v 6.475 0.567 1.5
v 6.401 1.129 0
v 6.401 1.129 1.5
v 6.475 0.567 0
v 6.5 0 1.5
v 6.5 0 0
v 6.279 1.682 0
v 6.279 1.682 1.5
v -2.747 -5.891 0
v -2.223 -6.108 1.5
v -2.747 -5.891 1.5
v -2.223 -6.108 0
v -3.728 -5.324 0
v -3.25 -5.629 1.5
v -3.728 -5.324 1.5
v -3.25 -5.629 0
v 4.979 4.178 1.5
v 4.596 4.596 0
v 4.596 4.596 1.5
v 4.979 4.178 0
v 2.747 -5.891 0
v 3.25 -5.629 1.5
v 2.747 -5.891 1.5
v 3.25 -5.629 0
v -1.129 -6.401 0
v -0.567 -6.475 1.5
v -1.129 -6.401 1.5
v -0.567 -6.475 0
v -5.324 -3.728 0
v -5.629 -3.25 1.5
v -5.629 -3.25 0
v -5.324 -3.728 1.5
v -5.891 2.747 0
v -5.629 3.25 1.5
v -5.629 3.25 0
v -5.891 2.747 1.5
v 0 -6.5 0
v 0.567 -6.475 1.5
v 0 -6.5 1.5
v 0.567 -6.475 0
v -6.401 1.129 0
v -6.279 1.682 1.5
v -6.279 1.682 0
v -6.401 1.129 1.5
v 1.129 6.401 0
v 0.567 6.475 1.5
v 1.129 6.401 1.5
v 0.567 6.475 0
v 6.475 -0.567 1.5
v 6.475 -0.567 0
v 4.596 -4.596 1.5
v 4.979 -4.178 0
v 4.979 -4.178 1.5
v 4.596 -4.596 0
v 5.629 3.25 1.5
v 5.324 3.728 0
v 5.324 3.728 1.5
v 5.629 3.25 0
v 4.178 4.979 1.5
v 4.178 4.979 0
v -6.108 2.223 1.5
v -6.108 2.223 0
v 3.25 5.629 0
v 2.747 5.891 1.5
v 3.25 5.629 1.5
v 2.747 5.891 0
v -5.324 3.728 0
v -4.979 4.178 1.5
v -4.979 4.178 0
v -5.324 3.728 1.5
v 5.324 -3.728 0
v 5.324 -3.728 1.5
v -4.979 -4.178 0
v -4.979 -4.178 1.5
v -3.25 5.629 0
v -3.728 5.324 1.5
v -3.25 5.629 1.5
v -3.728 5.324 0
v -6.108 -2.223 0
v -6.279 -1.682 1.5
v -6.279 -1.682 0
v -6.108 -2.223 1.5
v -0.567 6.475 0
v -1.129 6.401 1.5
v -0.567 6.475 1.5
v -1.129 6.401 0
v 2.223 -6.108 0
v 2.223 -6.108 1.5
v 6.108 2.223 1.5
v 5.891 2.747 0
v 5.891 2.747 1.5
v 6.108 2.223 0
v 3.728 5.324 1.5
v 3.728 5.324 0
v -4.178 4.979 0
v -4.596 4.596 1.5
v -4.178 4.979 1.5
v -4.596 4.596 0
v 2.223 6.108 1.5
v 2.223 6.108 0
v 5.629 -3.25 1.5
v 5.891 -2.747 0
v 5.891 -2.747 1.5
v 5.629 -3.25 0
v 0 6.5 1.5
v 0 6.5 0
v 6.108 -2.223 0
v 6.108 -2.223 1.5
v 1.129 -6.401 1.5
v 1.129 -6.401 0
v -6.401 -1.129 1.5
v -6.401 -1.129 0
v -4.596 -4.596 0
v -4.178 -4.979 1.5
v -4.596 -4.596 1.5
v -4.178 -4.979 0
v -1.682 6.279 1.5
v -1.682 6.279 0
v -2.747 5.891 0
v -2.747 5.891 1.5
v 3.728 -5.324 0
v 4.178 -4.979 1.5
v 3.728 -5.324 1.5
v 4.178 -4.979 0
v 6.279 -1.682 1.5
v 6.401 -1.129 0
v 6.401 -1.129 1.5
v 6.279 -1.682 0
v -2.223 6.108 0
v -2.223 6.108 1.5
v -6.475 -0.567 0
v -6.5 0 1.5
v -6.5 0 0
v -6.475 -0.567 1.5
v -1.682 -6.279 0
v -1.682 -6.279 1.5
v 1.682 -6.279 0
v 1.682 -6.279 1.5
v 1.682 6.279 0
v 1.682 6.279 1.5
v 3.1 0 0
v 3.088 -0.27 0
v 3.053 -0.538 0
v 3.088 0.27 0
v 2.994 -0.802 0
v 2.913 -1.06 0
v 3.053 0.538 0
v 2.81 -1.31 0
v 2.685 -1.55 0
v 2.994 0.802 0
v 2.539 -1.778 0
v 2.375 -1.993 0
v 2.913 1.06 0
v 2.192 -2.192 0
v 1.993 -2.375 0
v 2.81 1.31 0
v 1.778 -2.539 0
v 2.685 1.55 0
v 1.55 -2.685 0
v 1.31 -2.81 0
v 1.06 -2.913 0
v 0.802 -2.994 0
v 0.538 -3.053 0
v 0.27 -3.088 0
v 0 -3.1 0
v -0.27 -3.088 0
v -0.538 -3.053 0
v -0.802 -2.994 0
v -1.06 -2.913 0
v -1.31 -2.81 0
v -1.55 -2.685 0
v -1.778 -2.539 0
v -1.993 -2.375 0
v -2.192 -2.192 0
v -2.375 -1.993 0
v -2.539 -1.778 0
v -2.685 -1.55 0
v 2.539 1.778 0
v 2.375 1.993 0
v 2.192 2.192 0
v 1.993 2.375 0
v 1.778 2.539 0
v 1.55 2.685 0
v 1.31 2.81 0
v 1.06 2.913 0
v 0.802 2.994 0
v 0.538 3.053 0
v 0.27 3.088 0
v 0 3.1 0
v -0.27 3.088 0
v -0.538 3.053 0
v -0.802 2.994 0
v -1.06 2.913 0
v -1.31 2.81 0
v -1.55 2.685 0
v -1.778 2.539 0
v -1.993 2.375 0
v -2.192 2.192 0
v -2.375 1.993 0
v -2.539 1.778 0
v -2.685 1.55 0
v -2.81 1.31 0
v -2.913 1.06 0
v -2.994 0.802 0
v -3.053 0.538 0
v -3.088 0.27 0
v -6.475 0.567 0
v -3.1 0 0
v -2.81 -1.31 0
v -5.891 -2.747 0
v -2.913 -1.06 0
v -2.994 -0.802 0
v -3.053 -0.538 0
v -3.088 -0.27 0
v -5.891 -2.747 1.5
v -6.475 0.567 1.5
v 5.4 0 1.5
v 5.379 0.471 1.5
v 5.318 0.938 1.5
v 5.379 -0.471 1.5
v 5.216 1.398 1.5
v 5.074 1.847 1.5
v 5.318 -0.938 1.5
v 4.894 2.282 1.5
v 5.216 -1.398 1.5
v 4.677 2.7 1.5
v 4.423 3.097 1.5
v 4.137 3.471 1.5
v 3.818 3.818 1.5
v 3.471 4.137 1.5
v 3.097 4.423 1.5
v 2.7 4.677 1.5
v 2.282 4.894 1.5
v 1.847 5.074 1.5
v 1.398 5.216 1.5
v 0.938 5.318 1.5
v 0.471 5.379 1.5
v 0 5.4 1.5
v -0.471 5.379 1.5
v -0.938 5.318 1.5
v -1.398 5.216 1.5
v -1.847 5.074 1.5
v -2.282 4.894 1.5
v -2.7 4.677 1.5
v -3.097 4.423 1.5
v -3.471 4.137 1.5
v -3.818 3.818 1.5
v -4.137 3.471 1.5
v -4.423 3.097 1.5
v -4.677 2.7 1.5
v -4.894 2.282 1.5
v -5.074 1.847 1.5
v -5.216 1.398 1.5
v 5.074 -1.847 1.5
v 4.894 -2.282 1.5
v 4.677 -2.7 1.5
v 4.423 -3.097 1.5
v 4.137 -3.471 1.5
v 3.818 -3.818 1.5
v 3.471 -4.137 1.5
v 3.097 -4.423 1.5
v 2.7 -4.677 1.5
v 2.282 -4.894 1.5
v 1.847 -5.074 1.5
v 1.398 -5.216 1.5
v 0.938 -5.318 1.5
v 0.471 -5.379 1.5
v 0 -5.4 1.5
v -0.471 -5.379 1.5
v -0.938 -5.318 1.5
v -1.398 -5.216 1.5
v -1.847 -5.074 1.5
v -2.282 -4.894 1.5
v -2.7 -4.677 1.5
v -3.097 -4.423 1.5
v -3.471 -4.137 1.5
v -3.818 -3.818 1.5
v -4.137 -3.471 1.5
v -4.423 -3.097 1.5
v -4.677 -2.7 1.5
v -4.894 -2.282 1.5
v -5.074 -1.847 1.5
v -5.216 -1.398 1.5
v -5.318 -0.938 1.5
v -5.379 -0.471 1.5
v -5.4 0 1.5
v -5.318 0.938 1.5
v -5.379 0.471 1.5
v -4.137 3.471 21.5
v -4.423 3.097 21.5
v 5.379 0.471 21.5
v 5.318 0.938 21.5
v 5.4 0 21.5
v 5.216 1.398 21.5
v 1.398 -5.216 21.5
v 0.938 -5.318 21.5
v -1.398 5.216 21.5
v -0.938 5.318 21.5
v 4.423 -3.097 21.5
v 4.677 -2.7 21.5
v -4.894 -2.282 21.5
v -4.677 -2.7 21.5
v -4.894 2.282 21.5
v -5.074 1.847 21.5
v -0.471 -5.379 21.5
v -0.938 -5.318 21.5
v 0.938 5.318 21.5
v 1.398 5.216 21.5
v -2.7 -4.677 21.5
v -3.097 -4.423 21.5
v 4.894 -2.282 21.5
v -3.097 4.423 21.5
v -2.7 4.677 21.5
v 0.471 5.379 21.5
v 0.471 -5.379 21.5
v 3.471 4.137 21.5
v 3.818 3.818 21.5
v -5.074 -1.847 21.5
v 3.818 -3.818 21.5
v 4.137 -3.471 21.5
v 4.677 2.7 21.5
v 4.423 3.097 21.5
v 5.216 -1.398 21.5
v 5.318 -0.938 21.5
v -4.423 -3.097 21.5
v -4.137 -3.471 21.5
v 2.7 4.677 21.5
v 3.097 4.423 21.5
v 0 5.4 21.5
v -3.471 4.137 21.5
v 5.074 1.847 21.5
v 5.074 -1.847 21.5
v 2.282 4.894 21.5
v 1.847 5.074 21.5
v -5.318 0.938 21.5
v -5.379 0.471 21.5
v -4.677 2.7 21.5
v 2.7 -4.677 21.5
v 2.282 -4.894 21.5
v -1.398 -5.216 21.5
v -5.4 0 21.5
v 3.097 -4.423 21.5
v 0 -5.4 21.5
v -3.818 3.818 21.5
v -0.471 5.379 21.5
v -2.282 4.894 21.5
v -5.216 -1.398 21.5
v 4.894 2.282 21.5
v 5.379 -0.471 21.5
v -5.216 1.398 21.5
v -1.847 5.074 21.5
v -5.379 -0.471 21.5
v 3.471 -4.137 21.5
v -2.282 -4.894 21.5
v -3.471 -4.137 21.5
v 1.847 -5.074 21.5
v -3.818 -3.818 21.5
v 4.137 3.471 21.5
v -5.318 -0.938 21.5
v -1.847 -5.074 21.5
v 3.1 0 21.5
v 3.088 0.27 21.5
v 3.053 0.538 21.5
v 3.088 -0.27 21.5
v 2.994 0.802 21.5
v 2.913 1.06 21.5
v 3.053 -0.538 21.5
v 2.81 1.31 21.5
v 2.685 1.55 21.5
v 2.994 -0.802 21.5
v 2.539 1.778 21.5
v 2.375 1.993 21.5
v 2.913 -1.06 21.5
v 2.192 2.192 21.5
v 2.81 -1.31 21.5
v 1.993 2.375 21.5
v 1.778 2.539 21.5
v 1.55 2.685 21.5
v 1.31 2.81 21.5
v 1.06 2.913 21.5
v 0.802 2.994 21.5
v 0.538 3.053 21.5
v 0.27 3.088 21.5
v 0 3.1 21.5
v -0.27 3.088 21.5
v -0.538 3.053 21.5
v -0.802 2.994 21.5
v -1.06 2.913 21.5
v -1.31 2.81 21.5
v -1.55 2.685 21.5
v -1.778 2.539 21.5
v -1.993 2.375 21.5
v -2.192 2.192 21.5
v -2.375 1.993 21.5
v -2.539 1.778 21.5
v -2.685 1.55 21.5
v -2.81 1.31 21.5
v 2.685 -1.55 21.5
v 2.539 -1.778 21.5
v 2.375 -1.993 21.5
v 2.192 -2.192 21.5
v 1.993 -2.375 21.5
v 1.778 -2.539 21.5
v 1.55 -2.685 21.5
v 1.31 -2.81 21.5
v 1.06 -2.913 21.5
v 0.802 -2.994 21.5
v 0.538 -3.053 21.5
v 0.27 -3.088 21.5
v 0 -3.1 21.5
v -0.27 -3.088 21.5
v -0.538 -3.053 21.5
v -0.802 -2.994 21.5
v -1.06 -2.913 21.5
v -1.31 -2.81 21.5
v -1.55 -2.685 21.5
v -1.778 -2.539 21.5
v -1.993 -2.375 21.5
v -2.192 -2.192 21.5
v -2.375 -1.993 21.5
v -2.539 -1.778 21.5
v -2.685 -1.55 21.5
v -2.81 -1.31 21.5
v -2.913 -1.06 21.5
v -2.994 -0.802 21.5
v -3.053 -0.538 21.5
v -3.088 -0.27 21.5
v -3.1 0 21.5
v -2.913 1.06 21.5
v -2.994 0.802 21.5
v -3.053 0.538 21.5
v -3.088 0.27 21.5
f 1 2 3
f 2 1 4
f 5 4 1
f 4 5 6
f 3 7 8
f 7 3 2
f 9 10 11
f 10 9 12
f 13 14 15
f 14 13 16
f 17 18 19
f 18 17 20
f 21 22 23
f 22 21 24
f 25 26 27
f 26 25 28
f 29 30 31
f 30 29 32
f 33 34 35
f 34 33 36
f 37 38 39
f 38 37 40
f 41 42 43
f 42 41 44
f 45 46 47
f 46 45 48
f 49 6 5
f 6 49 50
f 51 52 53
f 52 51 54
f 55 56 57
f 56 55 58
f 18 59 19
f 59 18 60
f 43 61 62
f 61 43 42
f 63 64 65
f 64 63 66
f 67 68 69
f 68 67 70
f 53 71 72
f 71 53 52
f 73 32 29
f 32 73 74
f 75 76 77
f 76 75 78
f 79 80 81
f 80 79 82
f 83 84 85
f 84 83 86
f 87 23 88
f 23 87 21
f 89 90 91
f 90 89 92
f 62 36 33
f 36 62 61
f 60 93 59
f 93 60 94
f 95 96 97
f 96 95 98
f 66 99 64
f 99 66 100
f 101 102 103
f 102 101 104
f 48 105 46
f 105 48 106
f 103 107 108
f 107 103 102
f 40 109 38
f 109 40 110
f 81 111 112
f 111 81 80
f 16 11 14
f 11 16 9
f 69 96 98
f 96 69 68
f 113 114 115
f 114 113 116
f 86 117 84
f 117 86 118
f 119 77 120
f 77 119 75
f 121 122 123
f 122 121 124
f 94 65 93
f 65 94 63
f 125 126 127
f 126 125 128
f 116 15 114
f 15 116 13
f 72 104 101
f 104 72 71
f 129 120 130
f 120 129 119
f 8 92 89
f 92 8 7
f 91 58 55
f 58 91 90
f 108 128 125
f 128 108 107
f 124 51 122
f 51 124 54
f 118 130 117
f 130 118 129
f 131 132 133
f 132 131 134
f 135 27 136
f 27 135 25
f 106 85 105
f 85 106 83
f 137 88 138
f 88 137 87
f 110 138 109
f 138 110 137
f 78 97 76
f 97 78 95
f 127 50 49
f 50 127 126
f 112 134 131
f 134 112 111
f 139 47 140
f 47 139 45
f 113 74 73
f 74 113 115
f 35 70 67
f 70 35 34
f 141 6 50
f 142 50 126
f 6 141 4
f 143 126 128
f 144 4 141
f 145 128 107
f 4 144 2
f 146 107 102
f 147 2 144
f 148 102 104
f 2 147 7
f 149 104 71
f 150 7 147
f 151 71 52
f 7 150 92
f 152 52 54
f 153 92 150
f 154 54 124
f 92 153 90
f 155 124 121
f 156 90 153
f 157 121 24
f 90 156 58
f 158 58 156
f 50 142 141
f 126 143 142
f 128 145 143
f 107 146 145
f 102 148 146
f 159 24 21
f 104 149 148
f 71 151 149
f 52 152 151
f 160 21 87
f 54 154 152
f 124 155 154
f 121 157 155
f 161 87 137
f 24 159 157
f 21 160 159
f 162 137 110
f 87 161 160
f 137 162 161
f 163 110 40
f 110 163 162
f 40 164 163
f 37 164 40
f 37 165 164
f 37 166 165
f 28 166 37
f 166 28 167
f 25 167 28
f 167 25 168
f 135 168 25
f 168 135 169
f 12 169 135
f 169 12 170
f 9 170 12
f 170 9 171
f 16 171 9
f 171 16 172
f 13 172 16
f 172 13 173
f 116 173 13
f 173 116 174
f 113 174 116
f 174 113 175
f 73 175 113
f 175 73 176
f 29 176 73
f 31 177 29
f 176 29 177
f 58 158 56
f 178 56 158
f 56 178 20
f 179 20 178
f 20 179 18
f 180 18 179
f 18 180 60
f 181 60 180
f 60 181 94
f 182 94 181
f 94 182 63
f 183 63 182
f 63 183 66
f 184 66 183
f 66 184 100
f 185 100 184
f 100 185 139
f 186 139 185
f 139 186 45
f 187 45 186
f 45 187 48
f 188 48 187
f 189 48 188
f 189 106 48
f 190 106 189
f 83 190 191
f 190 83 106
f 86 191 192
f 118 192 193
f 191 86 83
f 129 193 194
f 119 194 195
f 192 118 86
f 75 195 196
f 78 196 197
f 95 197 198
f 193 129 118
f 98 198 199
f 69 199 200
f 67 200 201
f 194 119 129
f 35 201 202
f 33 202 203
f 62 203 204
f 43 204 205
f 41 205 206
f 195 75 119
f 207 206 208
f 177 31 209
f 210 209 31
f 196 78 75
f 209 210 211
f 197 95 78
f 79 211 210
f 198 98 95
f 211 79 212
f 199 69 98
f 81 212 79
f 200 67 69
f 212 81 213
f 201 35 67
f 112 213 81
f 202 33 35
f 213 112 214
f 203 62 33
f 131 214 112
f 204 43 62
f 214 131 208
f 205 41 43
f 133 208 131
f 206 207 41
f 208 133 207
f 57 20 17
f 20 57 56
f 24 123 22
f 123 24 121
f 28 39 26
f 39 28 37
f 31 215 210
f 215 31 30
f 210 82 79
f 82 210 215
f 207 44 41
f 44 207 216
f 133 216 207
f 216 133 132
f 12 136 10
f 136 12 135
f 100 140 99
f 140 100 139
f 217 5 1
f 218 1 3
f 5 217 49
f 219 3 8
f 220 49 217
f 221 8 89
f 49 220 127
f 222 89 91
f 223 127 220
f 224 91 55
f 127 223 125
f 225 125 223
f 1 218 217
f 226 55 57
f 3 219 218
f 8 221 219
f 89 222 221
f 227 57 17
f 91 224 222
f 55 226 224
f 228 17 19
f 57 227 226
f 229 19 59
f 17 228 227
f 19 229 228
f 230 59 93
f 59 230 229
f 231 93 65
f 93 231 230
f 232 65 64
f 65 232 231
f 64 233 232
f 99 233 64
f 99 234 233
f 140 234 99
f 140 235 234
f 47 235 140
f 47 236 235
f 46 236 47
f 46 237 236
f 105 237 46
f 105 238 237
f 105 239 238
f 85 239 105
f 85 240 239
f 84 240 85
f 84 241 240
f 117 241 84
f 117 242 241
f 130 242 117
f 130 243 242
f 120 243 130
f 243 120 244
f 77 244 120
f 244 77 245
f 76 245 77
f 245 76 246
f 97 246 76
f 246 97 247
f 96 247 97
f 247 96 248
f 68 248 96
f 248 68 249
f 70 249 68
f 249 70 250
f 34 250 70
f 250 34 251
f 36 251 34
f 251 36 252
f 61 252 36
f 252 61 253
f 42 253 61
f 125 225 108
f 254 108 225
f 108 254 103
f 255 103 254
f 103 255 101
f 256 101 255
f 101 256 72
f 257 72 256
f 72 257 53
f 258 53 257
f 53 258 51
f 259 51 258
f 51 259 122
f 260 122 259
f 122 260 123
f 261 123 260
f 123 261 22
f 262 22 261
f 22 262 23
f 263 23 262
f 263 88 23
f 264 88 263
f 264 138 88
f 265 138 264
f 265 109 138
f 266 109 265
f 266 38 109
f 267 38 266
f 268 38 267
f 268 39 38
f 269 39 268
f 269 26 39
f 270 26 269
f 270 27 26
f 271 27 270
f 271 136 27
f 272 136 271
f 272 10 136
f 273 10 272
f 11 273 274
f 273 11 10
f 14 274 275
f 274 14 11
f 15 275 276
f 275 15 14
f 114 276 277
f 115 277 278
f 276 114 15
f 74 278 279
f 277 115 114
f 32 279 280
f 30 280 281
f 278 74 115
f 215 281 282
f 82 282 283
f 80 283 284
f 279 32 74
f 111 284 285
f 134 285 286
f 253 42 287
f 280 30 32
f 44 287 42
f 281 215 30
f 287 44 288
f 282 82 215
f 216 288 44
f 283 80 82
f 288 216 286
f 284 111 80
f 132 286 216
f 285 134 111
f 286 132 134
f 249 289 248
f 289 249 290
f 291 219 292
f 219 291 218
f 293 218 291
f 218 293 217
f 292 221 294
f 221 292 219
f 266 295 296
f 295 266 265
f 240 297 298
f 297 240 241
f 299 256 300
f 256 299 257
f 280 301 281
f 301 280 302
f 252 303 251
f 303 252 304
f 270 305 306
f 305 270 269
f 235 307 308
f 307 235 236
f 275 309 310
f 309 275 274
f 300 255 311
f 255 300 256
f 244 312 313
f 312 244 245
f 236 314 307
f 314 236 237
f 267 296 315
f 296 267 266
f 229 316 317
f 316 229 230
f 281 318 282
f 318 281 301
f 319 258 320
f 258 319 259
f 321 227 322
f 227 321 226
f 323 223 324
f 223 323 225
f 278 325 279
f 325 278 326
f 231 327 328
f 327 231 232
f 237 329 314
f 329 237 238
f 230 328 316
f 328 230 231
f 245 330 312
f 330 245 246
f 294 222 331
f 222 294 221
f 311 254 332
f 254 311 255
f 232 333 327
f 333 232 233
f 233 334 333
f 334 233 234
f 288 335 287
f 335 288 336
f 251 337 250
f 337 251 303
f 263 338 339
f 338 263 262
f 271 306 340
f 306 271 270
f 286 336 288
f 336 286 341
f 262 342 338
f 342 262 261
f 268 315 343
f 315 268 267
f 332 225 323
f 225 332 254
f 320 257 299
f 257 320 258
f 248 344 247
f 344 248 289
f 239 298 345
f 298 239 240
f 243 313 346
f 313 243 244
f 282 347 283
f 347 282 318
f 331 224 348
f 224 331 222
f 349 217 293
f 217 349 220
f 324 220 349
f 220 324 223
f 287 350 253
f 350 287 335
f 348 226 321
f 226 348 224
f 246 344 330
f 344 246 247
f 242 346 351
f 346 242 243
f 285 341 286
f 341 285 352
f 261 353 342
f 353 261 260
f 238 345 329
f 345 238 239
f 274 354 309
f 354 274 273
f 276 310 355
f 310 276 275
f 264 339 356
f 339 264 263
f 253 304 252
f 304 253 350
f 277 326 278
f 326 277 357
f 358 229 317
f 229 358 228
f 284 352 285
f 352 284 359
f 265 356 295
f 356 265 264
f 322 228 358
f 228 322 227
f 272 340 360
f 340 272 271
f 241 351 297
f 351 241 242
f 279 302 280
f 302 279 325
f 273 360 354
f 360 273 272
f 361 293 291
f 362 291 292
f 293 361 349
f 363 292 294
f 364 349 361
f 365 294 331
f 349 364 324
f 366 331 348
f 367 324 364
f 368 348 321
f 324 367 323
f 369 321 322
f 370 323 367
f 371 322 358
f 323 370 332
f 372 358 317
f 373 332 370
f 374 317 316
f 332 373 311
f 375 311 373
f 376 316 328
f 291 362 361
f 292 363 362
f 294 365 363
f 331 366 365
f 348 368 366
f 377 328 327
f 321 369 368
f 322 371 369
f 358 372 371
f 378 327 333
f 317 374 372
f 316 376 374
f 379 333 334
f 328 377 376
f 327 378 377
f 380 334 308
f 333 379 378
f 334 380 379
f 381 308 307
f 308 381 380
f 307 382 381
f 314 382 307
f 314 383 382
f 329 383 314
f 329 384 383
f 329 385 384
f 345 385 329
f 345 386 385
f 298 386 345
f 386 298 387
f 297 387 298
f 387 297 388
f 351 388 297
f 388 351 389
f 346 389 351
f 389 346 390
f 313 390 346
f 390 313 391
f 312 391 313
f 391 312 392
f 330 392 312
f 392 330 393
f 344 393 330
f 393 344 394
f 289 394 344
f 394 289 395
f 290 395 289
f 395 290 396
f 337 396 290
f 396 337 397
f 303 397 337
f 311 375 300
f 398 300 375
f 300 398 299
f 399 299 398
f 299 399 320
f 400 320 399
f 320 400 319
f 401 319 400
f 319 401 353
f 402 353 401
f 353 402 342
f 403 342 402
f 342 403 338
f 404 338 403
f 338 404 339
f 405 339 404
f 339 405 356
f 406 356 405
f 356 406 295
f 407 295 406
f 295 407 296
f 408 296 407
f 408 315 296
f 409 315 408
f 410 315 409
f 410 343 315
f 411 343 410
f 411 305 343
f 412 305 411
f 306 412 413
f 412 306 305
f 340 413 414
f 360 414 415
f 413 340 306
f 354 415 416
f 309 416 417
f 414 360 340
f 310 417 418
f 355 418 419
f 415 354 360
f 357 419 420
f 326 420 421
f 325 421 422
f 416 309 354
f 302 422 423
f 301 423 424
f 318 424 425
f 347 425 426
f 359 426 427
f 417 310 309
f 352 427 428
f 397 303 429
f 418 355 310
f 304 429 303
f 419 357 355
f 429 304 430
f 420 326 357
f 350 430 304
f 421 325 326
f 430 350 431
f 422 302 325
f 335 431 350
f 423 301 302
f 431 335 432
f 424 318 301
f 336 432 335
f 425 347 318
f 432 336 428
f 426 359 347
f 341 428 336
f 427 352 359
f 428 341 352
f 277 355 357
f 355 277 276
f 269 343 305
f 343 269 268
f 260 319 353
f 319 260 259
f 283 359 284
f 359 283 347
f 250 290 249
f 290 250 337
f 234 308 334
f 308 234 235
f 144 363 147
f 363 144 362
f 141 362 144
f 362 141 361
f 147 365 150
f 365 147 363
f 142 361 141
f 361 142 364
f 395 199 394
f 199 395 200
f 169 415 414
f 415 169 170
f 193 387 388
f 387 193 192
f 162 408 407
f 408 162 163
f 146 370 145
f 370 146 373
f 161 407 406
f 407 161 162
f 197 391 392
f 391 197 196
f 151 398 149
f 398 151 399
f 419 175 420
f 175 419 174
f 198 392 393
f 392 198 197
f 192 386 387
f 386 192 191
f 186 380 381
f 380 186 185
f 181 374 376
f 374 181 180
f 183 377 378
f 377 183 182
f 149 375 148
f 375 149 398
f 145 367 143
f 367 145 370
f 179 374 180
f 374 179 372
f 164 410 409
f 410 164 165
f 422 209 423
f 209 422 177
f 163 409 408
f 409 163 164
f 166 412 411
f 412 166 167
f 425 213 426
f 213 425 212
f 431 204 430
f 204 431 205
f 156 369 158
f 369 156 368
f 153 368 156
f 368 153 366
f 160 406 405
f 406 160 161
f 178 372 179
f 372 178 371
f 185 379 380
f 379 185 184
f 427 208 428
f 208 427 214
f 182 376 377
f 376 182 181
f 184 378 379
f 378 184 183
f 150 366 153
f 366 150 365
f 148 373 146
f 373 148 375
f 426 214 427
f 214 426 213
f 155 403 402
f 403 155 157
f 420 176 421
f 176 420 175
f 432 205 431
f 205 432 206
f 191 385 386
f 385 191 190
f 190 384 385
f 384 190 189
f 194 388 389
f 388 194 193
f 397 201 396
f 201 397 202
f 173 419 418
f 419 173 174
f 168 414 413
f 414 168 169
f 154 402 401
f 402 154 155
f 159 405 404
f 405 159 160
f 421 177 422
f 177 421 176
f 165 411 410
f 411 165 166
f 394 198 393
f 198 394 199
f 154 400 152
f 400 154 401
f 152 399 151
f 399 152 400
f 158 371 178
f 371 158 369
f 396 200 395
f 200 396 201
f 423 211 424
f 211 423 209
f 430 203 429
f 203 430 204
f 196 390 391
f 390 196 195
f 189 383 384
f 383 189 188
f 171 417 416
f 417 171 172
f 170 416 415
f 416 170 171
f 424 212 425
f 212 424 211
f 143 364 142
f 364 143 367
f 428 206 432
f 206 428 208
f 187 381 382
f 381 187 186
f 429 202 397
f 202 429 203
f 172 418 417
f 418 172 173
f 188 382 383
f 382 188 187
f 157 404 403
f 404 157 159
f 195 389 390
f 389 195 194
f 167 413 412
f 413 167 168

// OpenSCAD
// Adapter sleeve - a collar with a sleeve body that lines a 1.5 mL tube rack hole to hold a
// 0.2 mL PCR tube. Printed upside down so the collar lies on the bed (z = 0) and the sleeve
// rises upward. A through-bore open at both ends seats the tube.
//

collar_d  = 13;
collar_h  = 1.5;
body_d    = 10.8;
body_h    = 21.5;
bore      = 6.2;

$fn = 72;

collar_t = 1.5;

difference() {
    union() {
        cylinder(h = collar_h, d = collar_d);
        cylinder(h = body_h, d = body_d);
    }
    translate([0, 0, -1]) cylinder(h = body_h + 2, d = bore);
    translate([0, 0, body_h + 0.5]) cylinder(h = collar_t + 1, d = bore);
}
